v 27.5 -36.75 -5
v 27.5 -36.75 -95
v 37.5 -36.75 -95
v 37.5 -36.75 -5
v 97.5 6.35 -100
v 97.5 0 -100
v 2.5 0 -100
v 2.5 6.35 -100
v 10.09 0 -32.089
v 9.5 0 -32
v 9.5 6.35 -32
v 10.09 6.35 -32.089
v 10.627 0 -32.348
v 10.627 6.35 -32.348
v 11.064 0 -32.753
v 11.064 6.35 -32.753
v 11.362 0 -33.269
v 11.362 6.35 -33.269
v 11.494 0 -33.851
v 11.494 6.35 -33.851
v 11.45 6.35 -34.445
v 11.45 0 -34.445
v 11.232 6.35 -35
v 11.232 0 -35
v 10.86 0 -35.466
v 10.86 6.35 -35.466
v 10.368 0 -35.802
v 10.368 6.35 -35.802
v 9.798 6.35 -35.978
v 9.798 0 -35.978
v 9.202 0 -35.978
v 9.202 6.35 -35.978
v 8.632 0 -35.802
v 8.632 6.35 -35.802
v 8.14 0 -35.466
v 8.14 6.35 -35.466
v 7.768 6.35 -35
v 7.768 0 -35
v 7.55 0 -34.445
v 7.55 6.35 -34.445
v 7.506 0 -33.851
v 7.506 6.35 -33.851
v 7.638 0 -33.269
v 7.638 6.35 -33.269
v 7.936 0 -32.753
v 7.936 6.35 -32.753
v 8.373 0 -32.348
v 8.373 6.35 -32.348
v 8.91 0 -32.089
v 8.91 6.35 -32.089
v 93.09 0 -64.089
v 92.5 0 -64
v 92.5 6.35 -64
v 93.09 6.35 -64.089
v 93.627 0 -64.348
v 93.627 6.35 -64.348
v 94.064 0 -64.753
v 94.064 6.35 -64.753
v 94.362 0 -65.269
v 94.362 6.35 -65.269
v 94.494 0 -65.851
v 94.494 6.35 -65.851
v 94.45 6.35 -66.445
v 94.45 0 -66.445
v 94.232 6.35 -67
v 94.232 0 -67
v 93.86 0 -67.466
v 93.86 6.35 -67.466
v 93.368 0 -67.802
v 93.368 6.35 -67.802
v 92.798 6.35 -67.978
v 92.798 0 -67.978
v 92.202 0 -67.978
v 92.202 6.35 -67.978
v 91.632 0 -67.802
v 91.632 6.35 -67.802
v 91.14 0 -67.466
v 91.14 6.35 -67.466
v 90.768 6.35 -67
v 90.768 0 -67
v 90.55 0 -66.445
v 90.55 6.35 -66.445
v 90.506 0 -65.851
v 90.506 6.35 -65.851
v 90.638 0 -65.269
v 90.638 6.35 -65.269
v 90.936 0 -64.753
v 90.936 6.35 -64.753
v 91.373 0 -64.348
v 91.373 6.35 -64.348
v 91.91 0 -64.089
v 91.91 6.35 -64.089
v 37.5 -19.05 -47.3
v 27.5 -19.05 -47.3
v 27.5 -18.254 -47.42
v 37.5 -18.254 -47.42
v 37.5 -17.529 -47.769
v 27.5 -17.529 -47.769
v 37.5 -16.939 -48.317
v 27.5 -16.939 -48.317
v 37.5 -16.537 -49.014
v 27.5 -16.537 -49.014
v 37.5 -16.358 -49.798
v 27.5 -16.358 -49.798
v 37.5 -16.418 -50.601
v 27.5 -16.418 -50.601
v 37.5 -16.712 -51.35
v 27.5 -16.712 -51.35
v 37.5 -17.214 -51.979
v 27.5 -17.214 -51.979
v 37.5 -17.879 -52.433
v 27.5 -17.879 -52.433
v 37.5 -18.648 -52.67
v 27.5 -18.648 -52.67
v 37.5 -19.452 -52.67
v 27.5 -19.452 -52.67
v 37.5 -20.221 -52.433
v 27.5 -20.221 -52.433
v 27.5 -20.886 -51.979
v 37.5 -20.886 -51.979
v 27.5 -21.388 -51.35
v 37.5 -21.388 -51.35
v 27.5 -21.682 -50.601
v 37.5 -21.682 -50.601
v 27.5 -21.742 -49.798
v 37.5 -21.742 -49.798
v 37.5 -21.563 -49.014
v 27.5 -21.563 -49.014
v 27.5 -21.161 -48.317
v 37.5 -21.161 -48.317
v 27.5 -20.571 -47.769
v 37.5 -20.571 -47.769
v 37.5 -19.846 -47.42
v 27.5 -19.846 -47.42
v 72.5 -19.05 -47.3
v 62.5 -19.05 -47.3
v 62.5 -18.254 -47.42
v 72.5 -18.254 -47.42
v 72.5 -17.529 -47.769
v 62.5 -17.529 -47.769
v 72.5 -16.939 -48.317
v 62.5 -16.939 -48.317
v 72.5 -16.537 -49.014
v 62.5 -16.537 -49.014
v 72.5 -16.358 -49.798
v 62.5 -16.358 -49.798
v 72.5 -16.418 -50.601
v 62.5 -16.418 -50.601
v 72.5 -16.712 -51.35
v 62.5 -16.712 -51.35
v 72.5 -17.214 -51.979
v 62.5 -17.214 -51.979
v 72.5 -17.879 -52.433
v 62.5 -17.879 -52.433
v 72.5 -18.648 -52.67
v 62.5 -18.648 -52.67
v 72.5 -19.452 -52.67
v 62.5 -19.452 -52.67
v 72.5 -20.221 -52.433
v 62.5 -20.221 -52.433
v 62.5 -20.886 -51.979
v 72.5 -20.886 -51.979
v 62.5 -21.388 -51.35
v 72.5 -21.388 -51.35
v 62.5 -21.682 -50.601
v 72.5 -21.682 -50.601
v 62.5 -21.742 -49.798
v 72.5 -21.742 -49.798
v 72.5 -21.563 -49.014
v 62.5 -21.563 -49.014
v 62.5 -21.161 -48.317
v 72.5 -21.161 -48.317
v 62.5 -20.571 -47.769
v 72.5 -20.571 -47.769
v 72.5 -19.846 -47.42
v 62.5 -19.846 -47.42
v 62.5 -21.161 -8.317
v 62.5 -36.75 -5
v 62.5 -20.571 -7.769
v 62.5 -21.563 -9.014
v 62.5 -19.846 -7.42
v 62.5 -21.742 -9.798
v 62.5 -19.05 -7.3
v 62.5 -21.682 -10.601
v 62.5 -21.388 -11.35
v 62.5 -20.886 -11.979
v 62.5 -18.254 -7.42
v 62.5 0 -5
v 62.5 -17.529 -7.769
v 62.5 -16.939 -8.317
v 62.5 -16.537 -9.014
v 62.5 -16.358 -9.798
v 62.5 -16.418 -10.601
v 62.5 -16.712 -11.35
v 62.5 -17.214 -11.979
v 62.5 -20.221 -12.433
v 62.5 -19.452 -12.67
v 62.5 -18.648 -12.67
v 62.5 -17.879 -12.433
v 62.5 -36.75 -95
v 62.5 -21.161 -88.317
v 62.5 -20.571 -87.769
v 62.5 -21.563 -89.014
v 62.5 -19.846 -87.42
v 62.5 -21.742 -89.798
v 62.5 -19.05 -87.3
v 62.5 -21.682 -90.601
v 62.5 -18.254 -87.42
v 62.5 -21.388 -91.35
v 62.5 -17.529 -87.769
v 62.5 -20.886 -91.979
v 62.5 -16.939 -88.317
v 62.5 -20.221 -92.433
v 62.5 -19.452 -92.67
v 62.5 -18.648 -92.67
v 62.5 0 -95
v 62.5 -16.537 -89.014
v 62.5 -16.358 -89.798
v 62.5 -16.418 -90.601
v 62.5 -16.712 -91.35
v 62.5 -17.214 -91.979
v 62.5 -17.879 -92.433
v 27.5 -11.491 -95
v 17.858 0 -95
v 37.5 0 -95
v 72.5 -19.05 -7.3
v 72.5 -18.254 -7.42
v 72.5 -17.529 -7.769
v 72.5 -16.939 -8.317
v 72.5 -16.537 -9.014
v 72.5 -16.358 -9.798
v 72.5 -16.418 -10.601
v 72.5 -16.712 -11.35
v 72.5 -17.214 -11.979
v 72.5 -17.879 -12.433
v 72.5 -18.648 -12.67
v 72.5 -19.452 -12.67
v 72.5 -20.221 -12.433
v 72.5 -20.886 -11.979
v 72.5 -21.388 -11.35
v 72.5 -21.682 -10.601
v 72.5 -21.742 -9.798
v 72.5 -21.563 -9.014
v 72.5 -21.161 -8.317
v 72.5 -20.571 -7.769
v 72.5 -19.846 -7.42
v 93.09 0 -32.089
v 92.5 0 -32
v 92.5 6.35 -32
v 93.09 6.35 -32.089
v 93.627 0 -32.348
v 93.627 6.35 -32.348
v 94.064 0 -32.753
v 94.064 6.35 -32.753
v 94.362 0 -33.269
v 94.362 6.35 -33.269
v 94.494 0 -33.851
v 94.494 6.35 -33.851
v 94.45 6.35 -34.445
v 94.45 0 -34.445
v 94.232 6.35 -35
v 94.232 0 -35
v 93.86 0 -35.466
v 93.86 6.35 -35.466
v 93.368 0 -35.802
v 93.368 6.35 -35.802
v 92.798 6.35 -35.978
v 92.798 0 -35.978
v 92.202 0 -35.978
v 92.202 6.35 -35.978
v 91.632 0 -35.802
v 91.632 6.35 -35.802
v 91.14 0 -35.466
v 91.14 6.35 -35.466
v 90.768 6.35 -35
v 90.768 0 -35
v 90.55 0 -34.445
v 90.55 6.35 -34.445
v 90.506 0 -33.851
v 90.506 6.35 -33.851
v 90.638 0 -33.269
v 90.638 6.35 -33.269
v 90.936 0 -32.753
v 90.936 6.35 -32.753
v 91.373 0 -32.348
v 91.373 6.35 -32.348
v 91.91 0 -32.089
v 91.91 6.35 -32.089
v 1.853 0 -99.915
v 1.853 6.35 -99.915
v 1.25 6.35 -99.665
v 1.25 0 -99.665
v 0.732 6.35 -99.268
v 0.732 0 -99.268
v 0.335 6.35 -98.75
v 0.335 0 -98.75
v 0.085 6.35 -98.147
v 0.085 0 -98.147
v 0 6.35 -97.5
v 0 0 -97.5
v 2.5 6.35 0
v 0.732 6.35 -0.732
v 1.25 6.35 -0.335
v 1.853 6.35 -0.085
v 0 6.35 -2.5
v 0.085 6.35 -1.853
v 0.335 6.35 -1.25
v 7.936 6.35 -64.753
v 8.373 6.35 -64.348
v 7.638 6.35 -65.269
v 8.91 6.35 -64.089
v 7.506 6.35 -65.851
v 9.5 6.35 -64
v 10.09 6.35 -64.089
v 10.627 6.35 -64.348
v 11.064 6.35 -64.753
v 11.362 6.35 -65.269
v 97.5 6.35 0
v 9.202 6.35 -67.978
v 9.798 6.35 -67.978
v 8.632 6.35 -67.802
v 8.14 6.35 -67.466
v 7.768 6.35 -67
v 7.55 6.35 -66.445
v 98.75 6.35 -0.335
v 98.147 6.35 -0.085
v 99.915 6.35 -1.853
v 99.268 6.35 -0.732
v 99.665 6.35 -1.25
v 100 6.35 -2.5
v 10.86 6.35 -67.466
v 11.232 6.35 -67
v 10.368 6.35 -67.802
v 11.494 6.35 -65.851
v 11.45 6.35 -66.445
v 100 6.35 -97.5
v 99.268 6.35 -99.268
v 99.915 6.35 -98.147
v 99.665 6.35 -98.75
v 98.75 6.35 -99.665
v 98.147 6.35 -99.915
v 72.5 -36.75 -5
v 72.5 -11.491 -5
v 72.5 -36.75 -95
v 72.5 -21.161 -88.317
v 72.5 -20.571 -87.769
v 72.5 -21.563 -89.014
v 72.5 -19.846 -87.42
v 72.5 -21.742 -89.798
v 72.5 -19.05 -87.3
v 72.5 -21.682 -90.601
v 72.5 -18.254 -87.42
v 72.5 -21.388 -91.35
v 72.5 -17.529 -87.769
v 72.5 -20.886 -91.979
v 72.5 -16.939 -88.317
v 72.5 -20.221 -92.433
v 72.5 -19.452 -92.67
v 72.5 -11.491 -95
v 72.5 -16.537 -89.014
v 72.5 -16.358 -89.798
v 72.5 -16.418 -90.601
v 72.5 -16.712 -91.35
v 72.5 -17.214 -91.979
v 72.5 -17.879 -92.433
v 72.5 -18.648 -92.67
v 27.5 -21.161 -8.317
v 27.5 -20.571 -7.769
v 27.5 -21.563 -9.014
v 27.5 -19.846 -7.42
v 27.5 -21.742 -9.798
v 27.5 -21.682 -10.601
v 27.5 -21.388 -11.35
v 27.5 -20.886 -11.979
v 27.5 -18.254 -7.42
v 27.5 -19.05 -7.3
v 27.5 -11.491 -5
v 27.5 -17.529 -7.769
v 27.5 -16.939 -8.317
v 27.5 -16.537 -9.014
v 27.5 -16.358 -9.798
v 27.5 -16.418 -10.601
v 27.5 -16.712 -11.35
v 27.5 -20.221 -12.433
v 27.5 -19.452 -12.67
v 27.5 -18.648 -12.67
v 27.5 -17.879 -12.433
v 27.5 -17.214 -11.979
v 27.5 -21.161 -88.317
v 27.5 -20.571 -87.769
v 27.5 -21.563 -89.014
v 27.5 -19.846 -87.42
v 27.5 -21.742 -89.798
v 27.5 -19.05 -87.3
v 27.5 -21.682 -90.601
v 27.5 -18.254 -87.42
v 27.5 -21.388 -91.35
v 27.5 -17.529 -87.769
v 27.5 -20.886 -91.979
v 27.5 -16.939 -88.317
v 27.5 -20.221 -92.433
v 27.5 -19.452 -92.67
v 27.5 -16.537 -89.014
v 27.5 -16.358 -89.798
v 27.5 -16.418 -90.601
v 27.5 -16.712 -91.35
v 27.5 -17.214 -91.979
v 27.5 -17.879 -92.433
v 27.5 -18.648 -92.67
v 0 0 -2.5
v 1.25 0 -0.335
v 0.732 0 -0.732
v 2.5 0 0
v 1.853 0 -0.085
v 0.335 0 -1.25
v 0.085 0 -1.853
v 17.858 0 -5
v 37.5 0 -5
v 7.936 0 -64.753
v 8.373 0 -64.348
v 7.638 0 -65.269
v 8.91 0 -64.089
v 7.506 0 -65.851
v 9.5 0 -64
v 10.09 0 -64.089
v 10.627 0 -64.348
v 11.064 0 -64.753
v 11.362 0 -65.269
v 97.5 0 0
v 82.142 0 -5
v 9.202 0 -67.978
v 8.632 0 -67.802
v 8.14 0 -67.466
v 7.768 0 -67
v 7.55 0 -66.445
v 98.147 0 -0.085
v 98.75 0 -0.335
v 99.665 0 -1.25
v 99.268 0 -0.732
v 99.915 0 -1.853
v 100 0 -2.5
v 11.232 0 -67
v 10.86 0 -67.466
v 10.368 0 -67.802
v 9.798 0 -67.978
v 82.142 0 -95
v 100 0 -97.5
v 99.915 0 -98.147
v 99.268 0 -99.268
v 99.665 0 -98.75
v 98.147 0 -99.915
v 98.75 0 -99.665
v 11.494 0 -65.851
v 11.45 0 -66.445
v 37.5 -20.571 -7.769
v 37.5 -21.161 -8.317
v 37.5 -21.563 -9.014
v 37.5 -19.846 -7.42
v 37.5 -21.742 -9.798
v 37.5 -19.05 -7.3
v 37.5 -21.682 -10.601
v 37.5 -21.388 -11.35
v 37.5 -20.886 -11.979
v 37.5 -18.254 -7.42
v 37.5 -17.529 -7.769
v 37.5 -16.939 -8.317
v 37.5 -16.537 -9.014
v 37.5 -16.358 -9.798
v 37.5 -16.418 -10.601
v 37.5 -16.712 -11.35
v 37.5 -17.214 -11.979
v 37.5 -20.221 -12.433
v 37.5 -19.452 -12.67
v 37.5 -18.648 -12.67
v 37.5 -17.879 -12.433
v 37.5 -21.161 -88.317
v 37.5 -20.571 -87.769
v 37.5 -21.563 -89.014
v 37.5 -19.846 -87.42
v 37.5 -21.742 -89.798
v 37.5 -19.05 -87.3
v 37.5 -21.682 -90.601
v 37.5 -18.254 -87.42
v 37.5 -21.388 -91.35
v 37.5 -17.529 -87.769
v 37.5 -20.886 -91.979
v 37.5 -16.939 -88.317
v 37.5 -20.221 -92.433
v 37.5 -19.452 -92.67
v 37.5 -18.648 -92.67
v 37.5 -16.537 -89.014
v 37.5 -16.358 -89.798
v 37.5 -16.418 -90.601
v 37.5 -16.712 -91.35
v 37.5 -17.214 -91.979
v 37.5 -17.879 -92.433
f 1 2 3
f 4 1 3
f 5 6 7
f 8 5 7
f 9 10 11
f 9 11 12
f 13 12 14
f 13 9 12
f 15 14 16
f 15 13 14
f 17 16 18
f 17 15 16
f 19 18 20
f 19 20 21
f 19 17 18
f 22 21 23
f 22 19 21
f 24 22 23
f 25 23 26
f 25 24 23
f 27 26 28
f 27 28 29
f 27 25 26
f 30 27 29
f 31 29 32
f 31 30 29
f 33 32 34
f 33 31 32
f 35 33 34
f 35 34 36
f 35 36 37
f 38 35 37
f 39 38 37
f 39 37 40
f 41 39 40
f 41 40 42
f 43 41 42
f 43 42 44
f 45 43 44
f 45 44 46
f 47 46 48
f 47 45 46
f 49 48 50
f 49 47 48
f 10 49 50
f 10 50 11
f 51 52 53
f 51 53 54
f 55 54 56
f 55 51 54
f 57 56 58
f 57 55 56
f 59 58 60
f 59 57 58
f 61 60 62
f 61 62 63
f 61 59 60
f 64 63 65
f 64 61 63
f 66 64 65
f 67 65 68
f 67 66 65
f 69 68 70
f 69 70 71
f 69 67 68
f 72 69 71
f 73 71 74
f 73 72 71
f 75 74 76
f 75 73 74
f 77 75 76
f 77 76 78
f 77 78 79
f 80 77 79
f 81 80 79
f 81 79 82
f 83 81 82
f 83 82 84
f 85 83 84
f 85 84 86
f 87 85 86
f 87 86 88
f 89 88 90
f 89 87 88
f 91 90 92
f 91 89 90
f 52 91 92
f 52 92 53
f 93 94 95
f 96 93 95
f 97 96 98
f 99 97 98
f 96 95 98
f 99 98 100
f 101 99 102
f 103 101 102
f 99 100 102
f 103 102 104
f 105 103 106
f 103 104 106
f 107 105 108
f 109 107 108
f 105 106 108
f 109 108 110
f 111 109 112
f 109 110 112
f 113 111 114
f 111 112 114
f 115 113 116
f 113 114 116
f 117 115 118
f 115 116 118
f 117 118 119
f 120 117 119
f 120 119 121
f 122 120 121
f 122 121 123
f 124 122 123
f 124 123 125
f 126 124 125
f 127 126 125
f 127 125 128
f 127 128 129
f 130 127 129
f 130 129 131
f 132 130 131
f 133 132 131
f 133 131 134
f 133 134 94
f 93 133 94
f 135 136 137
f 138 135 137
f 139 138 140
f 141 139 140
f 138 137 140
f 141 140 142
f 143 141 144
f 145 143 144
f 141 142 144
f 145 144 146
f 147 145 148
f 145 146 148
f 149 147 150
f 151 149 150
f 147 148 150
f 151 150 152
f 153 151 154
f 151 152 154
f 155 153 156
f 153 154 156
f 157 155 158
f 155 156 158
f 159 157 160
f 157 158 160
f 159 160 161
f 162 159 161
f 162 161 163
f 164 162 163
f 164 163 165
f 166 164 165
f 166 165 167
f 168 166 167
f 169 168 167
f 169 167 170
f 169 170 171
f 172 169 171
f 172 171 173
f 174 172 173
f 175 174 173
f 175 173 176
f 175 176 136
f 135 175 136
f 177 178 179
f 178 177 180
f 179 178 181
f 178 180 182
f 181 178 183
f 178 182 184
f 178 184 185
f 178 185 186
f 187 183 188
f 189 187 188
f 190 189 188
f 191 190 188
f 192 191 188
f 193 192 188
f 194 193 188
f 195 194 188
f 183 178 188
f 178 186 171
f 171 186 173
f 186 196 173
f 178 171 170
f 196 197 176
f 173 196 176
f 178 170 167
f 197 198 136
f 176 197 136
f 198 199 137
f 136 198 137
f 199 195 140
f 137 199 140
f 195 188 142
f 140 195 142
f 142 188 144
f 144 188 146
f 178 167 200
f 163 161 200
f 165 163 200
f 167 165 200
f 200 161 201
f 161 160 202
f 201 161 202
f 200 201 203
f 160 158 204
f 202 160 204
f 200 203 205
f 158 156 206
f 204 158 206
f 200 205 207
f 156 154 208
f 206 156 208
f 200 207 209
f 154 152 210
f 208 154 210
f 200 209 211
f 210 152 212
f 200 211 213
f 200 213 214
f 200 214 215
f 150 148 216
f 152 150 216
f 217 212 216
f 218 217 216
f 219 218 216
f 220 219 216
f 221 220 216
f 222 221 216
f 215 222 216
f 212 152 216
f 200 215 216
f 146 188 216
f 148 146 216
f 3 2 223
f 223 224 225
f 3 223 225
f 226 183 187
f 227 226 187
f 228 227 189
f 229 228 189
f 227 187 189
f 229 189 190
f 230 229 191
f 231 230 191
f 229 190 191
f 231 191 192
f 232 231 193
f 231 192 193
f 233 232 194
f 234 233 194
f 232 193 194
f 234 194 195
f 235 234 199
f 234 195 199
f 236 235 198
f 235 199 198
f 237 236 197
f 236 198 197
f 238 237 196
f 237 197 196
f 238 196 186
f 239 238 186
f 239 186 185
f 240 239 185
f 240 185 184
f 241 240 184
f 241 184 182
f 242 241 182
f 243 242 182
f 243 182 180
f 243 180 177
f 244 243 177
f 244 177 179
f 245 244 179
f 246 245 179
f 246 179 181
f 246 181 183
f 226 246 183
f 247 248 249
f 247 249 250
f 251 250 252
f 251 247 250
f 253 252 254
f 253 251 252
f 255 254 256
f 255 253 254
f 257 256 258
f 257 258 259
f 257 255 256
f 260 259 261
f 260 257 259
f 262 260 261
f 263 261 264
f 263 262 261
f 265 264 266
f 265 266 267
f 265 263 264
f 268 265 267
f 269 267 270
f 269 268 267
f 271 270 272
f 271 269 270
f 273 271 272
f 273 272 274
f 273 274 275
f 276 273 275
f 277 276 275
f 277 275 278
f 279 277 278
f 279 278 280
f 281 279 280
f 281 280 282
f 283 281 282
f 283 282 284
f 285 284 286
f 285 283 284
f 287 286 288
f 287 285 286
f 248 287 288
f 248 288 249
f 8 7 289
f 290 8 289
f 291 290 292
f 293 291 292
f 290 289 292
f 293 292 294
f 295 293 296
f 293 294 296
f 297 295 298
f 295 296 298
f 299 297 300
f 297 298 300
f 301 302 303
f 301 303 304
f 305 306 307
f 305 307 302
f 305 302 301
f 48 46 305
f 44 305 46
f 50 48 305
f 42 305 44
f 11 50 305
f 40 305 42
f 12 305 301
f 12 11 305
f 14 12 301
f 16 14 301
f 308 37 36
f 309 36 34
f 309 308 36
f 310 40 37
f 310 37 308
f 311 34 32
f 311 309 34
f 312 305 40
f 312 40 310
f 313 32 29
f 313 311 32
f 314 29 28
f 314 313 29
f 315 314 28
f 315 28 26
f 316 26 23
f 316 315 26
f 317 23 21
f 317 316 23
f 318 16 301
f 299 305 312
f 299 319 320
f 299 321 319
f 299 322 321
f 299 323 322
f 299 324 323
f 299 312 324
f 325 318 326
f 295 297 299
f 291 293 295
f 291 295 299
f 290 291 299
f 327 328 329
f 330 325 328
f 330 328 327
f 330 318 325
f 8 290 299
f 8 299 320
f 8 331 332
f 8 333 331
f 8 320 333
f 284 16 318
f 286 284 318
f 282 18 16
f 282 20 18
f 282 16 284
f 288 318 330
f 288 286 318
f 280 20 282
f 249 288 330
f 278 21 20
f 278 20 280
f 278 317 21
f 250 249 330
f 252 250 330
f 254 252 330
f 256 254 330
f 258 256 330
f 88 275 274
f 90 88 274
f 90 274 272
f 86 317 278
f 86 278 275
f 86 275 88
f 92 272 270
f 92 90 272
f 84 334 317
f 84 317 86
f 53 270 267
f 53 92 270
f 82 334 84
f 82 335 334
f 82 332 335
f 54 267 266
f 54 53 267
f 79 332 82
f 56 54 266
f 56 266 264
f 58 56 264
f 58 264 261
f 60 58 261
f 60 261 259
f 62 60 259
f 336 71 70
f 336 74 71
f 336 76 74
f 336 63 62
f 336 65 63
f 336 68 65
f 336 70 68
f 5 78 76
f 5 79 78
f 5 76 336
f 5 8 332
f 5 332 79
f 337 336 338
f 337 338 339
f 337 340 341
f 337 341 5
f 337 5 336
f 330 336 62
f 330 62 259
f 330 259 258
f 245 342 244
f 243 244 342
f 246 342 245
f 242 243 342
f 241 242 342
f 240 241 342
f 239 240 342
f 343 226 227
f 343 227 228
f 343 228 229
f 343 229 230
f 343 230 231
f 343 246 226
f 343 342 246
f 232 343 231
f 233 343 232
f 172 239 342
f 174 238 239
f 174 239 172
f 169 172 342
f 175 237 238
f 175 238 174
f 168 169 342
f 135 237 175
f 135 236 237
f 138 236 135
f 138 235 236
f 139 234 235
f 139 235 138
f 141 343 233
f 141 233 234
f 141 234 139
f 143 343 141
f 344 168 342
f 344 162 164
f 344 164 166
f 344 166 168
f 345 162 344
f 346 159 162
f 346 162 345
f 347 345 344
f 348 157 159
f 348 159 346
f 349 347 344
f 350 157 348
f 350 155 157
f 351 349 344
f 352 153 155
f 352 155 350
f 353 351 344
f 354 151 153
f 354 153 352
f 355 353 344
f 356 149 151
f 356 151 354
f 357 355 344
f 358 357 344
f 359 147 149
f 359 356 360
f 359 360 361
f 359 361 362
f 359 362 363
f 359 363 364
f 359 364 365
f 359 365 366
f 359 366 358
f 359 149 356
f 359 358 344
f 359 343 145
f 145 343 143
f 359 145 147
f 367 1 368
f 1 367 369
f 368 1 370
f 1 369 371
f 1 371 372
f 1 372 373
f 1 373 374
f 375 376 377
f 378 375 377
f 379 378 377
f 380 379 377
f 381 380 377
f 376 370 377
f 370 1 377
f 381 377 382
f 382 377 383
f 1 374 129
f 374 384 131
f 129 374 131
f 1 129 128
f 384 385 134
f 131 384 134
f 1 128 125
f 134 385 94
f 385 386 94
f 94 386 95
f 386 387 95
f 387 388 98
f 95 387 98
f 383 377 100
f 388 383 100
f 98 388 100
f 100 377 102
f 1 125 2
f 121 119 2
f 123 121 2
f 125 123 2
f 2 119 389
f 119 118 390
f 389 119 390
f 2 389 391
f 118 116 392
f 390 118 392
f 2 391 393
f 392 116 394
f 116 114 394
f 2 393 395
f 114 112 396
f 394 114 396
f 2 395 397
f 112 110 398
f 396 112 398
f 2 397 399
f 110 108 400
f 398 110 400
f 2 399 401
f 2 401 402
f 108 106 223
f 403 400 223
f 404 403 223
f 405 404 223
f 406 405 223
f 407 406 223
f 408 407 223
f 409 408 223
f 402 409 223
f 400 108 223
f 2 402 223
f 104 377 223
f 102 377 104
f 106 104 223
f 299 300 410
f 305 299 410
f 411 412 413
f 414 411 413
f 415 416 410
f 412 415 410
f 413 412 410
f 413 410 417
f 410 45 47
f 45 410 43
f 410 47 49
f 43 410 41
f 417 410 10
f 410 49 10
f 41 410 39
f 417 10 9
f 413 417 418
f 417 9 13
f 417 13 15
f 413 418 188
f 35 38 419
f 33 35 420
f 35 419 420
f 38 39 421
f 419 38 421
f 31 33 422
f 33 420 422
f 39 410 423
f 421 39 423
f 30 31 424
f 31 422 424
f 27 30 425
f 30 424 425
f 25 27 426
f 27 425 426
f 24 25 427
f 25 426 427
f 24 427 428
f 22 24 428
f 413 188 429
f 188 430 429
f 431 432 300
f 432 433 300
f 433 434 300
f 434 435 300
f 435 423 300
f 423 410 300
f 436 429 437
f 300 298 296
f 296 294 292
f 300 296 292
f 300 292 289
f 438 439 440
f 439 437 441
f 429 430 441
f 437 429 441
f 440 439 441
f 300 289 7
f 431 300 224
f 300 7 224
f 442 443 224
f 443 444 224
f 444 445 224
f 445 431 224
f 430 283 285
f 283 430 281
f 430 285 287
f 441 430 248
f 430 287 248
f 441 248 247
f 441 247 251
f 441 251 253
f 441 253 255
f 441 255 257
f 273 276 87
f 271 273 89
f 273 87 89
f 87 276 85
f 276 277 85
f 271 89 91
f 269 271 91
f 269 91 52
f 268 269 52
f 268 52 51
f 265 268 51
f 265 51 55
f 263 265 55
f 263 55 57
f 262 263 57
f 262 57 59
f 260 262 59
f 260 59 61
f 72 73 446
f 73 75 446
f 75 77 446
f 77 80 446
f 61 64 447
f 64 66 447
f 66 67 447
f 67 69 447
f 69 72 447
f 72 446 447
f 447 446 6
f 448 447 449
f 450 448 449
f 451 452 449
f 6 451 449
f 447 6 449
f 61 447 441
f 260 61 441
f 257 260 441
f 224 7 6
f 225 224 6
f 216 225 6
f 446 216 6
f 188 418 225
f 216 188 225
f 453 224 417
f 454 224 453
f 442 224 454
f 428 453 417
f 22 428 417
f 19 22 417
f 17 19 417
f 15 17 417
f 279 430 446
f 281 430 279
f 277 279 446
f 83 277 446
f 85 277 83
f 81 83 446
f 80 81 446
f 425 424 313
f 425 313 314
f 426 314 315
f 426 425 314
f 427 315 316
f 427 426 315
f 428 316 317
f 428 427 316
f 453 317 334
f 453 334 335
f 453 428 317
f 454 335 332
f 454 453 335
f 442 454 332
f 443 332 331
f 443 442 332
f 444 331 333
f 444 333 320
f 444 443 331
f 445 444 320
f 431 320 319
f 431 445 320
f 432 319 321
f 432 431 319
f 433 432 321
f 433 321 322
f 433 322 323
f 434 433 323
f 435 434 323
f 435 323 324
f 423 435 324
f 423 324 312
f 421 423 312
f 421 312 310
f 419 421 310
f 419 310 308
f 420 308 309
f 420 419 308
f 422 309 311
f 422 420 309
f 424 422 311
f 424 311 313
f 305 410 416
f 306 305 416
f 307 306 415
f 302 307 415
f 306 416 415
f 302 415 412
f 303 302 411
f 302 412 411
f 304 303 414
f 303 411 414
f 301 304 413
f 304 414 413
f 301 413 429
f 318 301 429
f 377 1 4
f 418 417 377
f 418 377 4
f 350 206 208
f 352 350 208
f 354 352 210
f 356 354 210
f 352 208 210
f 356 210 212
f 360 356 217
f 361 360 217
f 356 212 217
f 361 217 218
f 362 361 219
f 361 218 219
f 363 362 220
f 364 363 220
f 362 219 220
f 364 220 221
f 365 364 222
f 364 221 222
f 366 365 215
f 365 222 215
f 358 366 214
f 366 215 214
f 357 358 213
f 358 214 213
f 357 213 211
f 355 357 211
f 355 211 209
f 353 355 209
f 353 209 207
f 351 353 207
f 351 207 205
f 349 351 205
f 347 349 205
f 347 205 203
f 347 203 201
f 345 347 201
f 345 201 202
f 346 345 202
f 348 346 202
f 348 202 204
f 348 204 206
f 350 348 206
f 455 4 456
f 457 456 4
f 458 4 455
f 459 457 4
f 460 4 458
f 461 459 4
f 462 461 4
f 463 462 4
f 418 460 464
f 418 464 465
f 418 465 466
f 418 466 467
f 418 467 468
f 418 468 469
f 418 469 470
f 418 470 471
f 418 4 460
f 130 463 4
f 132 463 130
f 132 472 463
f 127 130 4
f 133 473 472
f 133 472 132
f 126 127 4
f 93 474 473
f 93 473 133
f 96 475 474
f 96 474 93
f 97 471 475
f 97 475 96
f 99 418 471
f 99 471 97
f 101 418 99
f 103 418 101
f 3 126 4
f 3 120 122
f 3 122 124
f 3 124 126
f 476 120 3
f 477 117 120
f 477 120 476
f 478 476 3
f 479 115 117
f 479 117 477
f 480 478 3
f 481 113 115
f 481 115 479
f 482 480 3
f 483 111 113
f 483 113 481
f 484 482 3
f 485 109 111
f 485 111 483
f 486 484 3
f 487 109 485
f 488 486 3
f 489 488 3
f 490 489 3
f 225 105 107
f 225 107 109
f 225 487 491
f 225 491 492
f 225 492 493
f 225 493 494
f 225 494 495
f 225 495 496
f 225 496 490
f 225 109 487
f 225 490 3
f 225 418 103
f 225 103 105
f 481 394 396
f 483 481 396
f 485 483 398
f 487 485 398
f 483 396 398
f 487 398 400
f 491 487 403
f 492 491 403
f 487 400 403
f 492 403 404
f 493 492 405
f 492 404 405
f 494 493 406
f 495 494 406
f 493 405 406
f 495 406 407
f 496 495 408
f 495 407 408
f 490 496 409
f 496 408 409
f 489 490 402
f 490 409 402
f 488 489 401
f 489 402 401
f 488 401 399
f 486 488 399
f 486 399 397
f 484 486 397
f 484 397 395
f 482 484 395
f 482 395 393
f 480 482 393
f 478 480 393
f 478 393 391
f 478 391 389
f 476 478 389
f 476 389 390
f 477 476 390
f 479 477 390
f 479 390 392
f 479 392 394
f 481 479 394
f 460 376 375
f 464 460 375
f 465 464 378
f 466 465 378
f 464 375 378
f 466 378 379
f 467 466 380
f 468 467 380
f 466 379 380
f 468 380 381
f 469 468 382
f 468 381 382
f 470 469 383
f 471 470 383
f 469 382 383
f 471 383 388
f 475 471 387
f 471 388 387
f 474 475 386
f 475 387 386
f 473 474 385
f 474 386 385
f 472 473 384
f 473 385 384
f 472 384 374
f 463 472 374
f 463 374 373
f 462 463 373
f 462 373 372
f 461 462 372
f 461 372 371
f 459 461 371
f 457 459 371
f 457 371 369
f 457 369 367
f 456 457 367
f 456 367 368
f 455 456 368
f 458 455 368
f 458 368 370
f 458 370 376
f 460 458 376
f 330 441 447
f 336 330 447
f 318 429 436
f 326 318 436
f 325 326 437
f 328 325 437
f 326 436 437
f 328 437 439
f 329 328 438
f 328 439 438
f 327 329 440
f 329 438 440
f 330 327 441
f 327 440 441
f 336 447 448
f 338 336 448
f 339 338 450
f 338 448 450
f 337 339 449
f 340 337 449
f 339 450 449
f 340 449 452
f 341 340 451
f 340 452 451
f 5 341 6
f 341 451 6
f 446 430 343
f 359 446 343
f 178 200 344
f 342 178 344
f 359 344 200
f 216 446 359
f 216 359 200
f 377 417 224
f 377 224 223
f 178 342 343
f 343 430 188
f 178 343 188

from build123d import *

# Parameters (mm, degrees)
SKETCH1_R           = 2
BOSS_EXTRUDE1_DEPTH = 6.35
SKETCH4_W           = 10
SKETCH4_H           = 90
BOSS_EXTRUDE2_DEPTH = 36.75
SKETCH5_R           = 2.7
CUT_EXTRUDE1_DEPTH  = 129.867422183
BOSS_EXTRUDE3_DEPTH = 90


with BuildPart() as part:
    # Sketch1 → Boss-Extrude1 (new body)
    with BuildSketch(Plane(origin=(0, 0, 0), x_dir=(1, 0, 0), z_dir=(0, 1, 0))):
        with BuildLine():
            Line((2.5, 0), (97.5, 0))
            ThreePointArc((97.5, 0), (99.267766953, 0.732233047), (100, 2.5))
            Line((100, 2.5), (100, 97.5))
            ThreePointArc((100, 97.5), (99.267766953, 99.267766953), (97.5, 100))
            Line((97.5, 100), (2.5, 100))
            ThreePointArc((2.5, 100), (0.732233047, 99.267766953), (0, 97.5))
            Line((0, 97.5), (0, 2.5))
            ThreePointArc((0, 2.5), (0.732233047, 0.732233047), (2.5, 0))
        make_face()
        with Locations(Location((9.5, 34, 0), (0, 0, 270))):
            Circle(SKETCH1_R, mode=Mode.SUBTRACT)
        with Locations(Location((9.5, 66, 0), (0, 0, 270))):
            Circle(SKETCH1_R, mode=Mode.SUBTRACT)
        with Locations(Location((92.5, 66, 0), (0, 0, 270))):
            Circle(SKETCH1_R, mode=Mode.SUBTRACT)
        with Locations(Location((92.5, 34, 0), (0, 0, 270))):
            Circle(SKETCH1_R, mode=Mode.SUBTRACT)
    extrude(amount=BOSS_EXTRUDE1_DEPTH)

    # Sketch4 → Boss-Extrude2 (add)
    with BuildSketch(Plane(origin=(0, 0, 0), x_dir=(1, 0, 0), z_dir=(0, 1, 0))):
        with Locations((32.5, 50)):
            Rectangle(SKETCH4_W, SKETCH4_H)
        with Locations((67.5, 50)):
            Rectangle(SKETCH4_W, SKETCH4_H)
    extrude(amount=-BOSS_EXTRUDE2_DEPTH)

    # Sketch5 → Cut-Extrude1 (cut, through all)
    with BuildSketch(Plane.ZY.offset(-27.5)):
        with Locations((-90, -19.05)):
            Circle(SKETCH5_R)
        with Locations((-50, -19.05)):
            Circle(SKETCH5_R)
        with Locations((-10, -19.05)):
            Circle(SKETCH5_R)
    extrude(amount=-CUT_EXTRUDE1_DEPTH, mode=Mode.SUBTRACT)

    # Sketch6 → Boss-Extrude3 (add)
    with BuildSketch(Plane.XY.offset(-5)):
        Polygon((72.5, 0), (82.141814145, 0), (72.5, -11.490666647), align=None)
        Polygon((27.5, 0), (17.858185855, 0), (27.5, -11.490666647), align=None)
    extrude(amount=-BOSS_EXTRUDE3_DEPTH)


solid = part.part
